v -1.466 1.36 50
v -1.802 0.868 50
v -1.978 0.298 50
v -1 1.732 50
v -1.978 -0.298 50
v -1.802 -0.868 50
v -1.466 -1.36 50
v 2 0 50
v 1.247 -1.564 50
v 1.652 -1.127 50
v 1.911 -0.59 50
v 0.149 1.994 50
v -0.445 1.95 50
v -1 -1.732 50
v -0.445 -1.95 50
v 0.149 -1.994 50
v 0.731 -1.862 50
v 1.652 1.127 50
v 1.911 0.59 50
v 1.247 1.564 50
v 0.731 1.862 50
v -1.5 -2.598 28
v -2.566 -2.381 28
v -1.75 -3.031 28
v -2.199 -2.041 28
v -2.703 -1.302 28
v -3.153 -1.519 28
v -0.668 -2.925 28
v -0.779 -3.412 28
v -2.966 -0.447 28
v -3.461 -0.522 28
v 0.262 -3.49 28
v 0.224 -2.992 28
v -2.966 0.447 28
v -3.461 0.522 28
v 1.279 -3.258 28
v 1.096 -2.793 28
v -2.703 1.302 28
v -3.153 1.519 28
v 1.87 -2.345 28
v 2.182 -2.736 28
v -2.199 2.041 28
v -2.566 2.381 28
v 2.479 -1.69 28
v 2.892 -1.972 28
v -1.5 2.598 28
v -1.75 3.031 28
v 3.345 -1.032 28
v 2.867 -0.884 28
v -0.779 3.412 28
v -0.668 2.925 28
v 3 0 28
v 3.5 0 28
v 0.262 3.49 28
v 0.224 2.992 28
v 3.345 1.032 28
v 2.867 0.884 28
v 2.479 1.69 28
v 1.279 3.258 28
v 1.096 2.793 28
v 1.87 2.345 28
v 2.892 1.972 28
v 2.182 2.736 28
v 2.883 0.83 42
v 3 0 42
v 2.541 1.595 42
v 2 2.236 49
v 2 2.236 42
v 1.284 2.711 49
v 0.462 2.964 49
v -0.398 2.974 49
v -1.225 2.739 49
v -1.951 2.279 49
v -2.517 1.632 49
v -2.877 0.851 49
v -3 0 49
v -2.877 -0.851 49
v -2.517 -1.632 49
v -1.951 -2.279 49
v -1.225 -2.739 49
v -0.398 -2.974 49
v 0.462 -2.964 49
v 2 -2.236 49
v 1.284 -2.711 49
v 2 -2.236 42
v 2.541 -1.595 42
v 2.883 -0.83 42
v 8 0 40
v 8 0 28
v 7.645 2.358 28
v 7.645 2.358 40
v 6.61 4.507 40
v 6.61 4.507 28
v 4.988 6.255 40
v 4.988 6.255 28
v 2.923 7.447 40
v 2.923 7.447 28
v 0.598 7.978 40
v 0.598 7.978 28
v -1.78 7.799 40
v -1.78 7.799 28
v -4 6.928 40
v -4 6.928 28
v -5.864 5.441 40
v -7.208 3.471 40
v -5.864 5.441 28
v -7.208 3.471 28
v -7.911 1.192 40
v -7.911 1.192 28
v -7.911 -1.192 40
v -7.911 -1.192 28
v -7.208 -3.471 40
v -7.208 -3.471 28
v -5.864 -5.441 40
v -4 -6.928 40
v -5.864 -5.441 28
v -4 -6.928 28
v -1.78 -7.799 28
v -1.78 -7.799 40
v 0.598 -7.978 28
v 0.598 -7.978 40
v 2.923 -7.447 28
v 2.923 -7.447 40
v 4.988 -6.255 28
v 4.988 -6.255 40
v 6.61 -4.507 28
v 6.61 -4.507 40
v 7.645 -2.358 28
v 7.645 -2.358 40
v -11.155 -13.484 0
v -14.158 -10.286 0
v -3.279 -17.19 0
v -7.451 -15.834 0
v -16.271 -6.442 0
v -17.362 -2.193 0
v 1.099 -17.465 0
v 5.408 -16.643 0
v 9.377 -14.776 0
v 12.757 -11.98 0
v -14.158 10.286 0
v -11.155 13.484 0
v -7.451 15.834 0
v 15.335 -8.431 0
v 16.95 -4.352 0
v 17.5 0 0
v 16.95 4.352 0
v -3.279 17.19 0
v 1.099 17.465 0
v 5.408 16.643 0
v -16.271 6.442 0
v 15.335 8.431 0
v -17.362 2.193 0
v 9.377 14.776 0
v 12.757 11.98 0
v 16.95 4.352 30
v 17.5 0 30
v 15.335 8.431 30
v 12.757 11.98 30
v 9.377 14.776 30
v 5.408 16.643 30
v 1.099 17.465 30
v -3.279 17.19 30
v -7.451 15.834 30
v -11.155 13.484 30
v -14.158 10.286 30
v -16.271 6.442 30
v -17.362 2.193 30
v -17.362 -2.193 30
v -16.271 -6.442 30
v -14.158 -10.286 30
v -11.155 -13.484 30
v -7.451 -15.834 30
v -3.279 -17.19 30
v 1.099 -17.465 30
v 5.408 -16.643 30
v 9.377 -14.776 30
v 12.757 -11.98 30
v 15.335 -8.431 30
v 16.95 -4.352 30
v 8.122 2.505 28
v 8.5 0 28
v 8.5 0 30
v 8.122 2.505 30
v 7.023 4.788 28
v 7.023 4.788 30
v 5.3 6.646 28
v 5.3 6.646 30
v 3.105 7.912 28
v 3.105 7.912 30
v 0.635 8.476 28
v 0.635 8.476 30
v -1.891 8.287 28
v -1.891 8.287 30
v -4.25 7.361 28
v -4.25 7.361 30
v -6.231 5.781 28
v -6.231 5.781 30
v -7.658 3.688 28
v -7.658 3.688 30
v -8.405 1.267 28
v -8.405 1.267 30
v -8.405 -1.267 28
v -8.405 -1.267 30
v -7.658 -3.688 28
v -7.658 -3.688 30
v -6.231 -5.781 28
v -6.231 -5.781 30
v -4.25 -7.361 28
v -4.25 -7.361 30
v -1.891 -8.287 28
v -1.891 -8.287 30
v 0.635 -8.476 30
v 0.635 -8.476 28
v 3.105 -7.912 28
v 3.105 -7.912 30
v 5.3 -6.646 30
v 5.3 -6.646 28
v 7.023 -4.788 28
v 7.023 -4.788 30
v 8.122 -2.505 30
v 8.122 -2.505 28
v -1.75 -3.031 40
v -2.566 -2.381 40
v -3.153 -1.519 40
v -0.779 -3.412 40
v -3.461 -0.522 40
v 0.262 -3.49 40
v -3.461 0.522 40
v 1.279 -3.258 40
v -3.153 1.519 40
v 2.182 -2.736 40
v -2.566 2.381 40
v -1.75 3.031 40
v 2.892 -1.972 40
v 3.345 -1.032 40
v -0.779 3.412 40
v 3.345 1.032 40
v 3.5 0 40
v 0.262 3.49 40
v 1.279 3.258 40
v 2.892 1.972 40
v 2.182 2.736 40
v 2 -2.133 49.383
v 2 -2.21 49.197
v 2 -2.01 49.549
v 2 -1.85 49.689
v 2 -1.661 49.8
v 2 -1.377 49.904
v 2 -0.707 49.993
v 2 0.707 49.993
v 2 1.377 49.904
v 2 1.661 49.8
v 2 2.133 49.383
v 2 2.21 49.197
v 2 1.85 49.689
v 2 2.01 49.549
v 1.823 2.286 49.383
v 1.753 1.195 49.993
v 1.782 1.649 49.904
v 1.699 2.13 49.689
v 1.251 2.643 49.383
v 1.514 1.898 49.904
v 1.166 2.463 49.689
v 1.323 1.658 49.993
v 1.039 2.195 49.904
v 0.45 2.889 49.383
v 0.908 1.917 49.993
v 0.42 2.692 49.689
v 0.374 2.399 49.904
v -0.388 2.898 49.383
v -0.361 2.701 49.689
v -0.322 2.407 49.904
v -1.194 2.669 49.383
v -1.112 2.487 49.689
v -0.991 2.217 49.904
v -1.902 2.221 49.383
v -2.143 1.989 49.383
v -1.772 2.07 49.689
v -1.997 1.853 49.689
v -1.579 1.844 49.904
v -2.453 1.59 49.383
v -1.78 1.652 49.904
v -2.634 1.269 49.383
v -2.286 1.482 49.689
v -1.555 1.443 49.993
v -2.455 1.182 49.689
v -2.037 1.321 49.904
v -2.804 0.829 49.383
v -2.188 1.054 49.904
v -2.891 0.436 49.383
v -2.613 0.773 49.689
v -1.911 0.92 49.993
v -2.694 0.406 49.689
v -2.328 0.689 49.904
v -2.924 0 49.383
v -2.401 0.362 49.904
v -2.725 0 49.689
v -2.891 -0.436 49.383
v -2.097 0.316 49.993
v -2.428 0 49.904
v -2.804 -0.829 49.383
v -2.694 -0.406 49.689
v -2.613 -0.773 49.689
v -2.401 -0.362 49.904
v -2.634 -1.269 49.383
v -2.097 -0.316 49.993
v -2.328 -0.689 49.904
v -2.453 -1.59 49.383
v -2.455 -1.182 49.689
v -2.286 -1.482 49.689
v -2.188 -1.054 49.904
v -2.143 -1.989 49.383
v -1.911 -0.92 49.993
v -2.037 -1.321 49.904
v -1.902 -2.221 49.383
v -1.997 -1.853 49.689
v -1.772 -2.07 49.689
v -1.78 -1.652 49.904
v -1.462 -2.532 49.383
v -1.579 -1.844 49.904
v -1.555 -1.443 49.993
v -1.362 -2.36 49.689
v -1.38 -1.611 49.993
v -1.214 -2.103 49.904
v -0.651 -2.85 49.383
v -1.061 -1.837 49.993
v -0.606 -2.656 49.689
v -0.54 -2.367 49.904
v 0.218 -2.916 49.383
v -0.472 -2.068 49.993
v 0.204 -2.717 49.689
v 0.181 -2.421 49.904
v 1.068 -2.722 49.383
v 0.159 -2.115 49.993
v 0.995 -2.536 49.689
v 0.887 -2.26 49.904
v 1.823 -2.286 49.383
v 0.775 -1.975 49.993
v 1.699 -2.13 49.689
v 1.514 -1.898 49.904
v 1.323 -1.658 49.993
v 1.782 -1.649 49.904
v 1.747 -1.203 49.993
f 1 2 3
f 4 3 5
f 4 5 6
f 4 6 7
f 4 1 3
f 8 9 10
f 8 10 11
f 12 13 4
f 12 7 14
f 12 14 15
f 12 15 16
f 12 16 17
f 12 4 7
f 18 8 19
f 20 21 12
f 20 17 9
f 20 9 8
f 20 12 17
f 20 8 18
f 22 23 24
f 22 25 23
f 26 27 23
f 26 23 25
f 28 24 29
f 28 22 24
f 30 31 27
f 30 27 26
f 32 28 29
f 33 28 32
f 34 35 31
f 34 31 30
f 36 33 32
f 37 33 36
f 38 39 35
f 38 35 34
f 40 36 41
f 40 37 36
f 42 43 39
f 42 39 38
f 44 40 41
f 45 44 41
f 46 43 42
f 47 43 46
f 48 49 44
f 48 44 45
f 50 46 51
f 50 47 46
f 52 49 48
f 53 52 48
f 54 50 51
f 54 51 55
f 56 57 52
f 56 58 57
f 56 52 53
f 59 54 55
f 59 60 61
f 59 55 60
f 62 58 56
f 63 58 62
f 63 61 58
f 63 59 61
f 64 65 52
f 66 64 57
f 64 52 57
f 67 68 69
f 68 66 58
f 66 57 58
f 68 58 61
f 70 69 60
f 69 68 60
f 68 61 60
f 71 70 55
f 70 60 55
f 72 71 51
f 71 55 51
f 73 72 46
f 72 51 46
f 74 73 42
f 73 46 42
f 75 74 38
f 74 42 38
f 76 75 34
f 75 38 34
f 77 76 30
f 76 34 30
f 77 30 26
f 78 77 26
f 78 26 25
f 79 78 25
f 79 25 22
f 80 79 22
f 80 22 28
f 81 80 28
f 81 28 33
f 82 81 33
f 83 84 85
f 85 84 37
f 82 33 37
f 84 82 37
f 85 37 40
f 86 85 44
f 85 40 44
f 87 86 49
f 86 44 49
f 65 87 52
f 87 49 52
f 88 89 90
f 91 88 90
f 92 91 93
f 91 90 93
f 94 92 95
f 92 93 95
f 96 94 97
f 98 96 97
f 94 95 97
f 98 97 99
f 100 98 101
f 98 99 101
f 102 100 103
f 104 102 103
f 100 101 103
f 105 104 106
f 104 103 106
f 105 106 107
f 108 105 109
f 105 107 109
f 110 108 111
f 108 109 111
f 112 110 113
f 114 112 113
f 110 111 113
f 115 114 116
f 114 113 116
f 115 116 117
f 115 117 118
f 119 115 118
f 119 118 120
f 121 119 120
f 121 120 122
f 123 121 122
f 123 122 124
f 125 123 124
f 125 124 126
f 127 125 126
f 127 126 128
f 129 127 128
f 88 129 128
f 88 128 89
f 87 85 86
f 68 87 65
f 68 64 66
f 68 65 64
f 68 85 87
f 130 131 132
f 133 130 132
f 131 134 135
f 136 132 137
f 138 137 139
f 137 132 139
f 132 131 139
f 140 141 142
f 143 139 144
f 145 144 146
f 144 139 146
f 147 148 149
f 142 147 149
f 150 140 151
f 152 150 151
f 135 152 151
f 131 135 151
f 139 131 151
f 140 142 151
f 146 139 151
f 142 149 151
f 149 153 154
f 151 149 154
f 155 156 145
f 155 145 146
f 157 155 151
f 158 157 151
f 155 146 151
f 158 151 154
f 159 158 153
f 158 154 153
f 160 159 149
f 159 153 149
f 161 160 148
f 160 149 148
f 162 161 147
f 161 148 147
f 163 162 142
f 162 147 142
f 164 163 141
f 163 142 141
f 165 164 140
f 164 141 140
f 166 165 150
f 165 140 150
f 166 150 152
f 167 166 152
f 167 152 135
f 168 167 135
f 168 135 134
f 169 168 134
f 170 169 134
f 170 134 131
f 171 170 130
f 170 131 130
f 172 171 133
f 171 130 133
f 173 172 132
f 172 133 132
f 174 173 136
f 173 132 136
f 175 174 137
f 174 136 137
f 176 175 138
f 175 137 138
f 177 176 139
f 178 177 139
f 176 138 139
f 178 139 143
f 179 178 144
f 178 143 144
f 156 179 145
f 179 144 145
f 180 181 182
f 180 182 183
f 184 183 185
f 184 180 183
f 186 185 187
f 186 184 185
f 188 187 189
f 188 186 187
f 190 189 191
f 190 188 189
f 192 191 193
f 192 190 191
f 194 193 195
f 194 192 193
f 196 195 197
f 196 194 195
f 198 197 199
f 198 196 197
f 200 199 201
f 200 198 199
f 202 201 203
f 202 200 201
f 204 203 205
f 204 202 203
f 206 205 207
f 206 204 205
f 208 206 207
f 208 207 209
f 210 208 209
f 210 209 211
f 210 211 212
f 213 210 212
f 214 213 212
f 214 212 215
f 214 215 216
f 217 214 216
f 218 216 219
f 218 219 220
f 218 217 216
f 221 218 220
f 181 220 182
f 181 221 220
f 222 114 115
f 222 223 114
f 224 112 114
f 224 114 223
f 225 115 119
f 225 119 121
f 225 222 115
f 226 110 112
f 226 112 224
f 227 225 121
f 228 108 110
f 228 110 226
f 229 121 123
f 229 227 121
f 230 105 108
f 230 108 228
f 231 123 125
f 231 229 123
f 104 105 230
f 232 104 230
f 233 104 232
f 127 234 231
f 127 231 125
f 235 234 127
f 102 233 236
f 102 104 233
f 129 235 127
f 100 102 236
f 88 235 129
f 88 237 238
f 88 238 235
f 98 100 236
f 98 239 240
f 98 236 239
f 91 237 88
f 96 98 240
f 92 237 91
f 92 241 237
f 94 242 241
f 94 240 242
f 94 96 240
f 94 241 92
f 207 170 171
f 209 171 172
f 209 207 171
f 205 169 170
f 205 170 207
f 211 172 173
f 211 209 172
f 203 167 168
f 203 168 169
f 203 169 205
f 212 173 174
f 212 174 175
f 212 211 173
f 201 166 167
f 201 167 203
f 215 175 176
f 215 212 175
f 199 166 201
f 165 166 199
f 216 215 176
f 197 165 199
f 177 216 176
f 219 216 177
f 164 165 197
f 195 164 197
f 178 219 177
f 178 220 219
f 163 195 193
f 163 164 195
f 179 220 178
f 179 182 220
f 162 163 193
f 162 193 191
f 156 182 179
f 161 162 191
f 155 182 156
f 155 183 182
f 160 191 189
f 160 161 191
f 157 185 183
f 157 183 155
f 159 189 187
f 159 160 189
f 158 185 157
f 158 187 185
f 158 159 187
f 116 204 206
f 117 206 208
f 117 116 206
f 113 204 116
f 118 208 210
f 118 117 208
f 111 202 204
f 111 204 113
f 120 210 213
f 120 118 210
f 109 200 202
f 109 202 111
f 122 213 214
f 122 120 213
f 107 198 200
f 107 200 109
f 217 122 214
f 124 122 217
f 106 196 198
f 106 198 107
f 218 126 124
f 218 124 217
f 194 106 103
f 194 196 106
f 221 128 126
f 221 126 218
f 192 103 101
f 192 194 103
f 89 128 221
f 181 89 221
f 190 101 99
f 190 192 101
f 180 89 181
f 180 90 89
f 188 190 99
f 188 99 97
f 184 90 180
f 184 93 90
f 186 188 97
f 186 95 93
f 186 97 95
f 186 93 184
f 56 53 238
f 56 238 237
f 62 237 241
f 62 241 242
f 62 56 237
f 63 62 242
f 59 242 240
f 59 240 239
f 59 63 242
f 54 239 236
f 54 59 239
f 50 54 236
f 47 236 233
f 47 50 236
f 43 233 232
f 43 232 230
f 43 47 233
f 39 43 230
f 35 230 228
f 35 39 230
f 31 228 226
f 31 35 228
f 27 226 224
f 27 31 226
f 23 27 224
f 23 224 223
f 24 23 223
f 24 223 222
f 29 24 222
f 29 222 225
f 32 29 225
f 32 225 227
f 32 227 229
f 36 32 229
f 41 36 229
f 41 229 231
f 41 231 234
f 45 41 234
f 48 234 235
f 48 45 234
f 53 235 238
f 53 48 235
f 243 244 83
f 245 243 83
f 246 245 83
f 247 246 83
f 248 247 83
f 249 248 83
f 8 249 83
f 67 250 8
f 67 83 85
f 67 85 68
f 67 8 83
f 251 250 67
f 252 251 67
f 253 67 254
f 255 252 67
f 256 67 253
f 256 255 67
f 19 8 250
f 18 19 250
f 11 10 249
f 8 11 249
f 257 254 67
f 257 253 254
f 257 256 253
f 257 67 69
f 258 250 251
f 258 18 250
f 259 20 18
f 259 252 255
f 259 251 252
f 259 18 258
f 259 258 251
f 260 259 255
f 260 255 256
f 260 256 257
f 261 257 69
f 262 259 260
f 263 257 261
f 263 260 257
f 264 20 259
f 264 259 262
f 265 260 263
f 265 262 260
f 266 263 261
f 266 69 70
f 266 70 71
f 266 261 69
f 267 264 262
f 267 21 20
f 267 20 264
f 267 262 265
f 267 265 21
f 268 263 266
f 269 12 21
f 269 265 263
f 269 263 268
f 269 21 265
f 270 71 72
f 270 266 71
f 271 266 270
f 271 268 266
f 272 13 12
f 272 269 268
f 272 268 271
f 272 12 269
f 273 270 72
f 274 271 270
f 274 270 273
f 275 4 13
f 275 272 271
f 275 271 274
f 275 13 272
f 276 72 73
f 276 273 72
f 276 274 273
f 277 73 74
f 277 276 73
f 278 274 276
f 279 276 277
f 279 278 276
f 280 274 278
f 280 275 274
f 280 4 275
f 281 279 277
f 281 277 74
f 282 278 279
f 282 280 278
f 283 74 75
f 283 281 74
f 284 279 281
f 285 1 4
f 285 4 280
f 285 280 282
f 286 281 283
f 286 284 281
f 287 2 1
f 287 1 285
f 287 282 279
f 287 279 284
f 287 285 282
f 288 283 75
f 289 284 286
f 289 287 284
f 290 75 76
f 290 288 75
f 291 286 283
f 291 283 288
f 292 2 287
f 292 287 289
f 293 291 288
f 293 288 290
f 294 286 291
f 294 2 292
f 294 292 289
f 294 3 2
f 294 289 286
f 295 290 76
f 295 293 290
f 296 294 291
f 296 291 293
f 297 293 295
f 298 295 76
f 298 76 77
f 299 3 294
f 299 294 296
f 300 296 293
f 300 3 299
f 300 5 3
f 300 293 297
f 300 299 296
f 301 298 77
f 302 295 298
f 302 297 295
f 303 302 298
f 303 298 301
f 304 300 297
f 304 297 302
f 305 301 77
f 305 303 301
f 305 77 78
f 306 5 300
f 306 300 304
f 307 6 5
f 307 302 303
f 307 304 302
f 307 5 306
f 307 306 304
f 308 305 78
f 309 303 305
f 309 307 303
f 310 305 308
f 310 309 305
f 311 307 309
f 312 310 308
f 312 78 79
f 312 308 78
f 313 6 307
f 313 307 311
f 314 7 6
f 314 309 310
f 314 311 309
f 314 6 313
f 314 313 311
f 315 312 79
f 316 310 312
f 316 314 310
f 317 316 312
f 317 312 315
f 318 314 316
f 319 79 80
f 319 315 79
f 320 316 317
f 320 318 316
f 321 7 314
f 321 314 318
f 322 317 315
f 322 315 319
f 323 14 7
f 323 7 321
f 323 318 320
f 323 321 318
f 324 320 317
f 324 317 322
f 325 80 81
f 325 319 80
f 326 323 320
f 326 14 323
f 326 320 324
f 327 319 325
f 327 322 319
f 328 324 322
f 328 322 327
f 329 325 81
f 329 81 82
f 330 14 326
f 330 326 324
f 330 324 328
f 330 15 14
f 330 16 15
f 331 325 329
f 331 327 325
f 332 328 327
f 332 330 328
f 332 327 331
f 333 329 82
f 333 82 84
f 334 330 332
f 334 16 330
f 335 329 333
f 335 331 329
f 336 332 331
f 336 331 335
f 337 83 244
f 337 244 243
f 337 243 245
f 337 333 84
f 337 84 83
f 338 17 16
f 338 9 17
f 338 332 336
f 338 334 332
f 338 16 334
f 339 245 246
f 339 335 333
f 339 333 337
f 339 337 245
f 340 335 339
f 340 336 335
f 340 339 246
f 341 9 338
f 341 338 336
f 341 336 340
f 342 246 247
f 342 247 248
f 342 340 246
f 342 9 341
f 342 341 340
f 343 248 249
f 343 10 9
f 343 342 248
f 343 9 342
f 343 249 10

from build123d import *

# Parameters (mm, degrees)
SKETCH_1_R          = 17.5
EXTRUDE_1_DEPTH     = 30
SKETCH_2_R          = 8
EXTRUDE_2_DEPTH     = 10
CUT_EXTRUDE_START   = -2
SKETCH_3_R          = 8.5
SKETCH_3_R_2        = 8
CUT_EXTRUDE_1_DEPTH = 2
SKETCH_4_R          = 3
EXTRUDE_3_DEPTH     = 10
CUT_EXTRUDE_START_2 = -12
SKETCH_5_R          = 3.5
SKETCH_5_R_2        = 3
CUT_EXTRUDE_2_DEPTH = 12
FILLET_1_R          = 1
SKETCH_6_W          = 2.555325261
SKETCH_6_H          = 9.362978713
CUT_EXTRUDE_3_DEPTH = 8


with BuildPart() as part:
    # 草图1 → 凸台-拉伸1 (new body)
    with BuildSketch(Plane.XY):
        Circle(SKETCH_1_R)
    extrude(amount=EXTRUDE_1_DEPTH)

    # 草图2 → 凸台-拉伸2 (add)
    with BuildSketch(Plane.XY.offset(30)):
        Circle(SKETCH_2_R)
    extrude(amount=EXTRUDE_2_DEPTH)

    # 草图3 → 切除-拉伸1 (cut)
    with BuildSketch(Plane.XY.offset(30).offset(CUT_EXTRUDE_START)):
        Circle(SKETCH_3_R)
        Circle(SKETCH_3_R_2, mode=Mode.SUBTRACT)
    extrude(amount=CUT_EXTRUDE_1_DEPTH, mode=Mode.SUBTRACT)

    # 草图4 → 凸台-拉伸3 (add)
    with BuildSketch(Plane.XY.offset(40)):
        Circle(SKETCH_4_R)
    extrude(amount=EXTRUDE_3_DEPTH)

    # 草图5 → 切除-拉伸2 (cut)
    with BuildSketch(Plane.XY.offset(40).offset(CUT_EXTRUDE_START_2)):
        Circle(SKETCH_5_R)
        Circle(SKETCH_5_R_2, mode=Mode.SUBTRACT)
    extrude(amount=CUT_EXTRUDE_2_DEPTH, mode=Mode.SUBTRACT)

    # 圆角1
    fillet_1_edges = [part.edges().sort_by_distance(p)[0] for p in [
        (-3, 0, 50),
    ]]
    fillet(fillet_1_edges, radius=FILLET_1_R)

    # 草图6 → 切除-拉伸3 (cut)
    with BuildSketch(Plane.XY.offset(50)):
        with Locations((3.277662631, -1.004075507)):
            Rectangle(SKETCH_6_W, SKETCH_6_H)
    extrude(amount=-CUT_EXTRUDE_3_DEPTH, mode=Mode.SUBTRACT)


solid = part.part
